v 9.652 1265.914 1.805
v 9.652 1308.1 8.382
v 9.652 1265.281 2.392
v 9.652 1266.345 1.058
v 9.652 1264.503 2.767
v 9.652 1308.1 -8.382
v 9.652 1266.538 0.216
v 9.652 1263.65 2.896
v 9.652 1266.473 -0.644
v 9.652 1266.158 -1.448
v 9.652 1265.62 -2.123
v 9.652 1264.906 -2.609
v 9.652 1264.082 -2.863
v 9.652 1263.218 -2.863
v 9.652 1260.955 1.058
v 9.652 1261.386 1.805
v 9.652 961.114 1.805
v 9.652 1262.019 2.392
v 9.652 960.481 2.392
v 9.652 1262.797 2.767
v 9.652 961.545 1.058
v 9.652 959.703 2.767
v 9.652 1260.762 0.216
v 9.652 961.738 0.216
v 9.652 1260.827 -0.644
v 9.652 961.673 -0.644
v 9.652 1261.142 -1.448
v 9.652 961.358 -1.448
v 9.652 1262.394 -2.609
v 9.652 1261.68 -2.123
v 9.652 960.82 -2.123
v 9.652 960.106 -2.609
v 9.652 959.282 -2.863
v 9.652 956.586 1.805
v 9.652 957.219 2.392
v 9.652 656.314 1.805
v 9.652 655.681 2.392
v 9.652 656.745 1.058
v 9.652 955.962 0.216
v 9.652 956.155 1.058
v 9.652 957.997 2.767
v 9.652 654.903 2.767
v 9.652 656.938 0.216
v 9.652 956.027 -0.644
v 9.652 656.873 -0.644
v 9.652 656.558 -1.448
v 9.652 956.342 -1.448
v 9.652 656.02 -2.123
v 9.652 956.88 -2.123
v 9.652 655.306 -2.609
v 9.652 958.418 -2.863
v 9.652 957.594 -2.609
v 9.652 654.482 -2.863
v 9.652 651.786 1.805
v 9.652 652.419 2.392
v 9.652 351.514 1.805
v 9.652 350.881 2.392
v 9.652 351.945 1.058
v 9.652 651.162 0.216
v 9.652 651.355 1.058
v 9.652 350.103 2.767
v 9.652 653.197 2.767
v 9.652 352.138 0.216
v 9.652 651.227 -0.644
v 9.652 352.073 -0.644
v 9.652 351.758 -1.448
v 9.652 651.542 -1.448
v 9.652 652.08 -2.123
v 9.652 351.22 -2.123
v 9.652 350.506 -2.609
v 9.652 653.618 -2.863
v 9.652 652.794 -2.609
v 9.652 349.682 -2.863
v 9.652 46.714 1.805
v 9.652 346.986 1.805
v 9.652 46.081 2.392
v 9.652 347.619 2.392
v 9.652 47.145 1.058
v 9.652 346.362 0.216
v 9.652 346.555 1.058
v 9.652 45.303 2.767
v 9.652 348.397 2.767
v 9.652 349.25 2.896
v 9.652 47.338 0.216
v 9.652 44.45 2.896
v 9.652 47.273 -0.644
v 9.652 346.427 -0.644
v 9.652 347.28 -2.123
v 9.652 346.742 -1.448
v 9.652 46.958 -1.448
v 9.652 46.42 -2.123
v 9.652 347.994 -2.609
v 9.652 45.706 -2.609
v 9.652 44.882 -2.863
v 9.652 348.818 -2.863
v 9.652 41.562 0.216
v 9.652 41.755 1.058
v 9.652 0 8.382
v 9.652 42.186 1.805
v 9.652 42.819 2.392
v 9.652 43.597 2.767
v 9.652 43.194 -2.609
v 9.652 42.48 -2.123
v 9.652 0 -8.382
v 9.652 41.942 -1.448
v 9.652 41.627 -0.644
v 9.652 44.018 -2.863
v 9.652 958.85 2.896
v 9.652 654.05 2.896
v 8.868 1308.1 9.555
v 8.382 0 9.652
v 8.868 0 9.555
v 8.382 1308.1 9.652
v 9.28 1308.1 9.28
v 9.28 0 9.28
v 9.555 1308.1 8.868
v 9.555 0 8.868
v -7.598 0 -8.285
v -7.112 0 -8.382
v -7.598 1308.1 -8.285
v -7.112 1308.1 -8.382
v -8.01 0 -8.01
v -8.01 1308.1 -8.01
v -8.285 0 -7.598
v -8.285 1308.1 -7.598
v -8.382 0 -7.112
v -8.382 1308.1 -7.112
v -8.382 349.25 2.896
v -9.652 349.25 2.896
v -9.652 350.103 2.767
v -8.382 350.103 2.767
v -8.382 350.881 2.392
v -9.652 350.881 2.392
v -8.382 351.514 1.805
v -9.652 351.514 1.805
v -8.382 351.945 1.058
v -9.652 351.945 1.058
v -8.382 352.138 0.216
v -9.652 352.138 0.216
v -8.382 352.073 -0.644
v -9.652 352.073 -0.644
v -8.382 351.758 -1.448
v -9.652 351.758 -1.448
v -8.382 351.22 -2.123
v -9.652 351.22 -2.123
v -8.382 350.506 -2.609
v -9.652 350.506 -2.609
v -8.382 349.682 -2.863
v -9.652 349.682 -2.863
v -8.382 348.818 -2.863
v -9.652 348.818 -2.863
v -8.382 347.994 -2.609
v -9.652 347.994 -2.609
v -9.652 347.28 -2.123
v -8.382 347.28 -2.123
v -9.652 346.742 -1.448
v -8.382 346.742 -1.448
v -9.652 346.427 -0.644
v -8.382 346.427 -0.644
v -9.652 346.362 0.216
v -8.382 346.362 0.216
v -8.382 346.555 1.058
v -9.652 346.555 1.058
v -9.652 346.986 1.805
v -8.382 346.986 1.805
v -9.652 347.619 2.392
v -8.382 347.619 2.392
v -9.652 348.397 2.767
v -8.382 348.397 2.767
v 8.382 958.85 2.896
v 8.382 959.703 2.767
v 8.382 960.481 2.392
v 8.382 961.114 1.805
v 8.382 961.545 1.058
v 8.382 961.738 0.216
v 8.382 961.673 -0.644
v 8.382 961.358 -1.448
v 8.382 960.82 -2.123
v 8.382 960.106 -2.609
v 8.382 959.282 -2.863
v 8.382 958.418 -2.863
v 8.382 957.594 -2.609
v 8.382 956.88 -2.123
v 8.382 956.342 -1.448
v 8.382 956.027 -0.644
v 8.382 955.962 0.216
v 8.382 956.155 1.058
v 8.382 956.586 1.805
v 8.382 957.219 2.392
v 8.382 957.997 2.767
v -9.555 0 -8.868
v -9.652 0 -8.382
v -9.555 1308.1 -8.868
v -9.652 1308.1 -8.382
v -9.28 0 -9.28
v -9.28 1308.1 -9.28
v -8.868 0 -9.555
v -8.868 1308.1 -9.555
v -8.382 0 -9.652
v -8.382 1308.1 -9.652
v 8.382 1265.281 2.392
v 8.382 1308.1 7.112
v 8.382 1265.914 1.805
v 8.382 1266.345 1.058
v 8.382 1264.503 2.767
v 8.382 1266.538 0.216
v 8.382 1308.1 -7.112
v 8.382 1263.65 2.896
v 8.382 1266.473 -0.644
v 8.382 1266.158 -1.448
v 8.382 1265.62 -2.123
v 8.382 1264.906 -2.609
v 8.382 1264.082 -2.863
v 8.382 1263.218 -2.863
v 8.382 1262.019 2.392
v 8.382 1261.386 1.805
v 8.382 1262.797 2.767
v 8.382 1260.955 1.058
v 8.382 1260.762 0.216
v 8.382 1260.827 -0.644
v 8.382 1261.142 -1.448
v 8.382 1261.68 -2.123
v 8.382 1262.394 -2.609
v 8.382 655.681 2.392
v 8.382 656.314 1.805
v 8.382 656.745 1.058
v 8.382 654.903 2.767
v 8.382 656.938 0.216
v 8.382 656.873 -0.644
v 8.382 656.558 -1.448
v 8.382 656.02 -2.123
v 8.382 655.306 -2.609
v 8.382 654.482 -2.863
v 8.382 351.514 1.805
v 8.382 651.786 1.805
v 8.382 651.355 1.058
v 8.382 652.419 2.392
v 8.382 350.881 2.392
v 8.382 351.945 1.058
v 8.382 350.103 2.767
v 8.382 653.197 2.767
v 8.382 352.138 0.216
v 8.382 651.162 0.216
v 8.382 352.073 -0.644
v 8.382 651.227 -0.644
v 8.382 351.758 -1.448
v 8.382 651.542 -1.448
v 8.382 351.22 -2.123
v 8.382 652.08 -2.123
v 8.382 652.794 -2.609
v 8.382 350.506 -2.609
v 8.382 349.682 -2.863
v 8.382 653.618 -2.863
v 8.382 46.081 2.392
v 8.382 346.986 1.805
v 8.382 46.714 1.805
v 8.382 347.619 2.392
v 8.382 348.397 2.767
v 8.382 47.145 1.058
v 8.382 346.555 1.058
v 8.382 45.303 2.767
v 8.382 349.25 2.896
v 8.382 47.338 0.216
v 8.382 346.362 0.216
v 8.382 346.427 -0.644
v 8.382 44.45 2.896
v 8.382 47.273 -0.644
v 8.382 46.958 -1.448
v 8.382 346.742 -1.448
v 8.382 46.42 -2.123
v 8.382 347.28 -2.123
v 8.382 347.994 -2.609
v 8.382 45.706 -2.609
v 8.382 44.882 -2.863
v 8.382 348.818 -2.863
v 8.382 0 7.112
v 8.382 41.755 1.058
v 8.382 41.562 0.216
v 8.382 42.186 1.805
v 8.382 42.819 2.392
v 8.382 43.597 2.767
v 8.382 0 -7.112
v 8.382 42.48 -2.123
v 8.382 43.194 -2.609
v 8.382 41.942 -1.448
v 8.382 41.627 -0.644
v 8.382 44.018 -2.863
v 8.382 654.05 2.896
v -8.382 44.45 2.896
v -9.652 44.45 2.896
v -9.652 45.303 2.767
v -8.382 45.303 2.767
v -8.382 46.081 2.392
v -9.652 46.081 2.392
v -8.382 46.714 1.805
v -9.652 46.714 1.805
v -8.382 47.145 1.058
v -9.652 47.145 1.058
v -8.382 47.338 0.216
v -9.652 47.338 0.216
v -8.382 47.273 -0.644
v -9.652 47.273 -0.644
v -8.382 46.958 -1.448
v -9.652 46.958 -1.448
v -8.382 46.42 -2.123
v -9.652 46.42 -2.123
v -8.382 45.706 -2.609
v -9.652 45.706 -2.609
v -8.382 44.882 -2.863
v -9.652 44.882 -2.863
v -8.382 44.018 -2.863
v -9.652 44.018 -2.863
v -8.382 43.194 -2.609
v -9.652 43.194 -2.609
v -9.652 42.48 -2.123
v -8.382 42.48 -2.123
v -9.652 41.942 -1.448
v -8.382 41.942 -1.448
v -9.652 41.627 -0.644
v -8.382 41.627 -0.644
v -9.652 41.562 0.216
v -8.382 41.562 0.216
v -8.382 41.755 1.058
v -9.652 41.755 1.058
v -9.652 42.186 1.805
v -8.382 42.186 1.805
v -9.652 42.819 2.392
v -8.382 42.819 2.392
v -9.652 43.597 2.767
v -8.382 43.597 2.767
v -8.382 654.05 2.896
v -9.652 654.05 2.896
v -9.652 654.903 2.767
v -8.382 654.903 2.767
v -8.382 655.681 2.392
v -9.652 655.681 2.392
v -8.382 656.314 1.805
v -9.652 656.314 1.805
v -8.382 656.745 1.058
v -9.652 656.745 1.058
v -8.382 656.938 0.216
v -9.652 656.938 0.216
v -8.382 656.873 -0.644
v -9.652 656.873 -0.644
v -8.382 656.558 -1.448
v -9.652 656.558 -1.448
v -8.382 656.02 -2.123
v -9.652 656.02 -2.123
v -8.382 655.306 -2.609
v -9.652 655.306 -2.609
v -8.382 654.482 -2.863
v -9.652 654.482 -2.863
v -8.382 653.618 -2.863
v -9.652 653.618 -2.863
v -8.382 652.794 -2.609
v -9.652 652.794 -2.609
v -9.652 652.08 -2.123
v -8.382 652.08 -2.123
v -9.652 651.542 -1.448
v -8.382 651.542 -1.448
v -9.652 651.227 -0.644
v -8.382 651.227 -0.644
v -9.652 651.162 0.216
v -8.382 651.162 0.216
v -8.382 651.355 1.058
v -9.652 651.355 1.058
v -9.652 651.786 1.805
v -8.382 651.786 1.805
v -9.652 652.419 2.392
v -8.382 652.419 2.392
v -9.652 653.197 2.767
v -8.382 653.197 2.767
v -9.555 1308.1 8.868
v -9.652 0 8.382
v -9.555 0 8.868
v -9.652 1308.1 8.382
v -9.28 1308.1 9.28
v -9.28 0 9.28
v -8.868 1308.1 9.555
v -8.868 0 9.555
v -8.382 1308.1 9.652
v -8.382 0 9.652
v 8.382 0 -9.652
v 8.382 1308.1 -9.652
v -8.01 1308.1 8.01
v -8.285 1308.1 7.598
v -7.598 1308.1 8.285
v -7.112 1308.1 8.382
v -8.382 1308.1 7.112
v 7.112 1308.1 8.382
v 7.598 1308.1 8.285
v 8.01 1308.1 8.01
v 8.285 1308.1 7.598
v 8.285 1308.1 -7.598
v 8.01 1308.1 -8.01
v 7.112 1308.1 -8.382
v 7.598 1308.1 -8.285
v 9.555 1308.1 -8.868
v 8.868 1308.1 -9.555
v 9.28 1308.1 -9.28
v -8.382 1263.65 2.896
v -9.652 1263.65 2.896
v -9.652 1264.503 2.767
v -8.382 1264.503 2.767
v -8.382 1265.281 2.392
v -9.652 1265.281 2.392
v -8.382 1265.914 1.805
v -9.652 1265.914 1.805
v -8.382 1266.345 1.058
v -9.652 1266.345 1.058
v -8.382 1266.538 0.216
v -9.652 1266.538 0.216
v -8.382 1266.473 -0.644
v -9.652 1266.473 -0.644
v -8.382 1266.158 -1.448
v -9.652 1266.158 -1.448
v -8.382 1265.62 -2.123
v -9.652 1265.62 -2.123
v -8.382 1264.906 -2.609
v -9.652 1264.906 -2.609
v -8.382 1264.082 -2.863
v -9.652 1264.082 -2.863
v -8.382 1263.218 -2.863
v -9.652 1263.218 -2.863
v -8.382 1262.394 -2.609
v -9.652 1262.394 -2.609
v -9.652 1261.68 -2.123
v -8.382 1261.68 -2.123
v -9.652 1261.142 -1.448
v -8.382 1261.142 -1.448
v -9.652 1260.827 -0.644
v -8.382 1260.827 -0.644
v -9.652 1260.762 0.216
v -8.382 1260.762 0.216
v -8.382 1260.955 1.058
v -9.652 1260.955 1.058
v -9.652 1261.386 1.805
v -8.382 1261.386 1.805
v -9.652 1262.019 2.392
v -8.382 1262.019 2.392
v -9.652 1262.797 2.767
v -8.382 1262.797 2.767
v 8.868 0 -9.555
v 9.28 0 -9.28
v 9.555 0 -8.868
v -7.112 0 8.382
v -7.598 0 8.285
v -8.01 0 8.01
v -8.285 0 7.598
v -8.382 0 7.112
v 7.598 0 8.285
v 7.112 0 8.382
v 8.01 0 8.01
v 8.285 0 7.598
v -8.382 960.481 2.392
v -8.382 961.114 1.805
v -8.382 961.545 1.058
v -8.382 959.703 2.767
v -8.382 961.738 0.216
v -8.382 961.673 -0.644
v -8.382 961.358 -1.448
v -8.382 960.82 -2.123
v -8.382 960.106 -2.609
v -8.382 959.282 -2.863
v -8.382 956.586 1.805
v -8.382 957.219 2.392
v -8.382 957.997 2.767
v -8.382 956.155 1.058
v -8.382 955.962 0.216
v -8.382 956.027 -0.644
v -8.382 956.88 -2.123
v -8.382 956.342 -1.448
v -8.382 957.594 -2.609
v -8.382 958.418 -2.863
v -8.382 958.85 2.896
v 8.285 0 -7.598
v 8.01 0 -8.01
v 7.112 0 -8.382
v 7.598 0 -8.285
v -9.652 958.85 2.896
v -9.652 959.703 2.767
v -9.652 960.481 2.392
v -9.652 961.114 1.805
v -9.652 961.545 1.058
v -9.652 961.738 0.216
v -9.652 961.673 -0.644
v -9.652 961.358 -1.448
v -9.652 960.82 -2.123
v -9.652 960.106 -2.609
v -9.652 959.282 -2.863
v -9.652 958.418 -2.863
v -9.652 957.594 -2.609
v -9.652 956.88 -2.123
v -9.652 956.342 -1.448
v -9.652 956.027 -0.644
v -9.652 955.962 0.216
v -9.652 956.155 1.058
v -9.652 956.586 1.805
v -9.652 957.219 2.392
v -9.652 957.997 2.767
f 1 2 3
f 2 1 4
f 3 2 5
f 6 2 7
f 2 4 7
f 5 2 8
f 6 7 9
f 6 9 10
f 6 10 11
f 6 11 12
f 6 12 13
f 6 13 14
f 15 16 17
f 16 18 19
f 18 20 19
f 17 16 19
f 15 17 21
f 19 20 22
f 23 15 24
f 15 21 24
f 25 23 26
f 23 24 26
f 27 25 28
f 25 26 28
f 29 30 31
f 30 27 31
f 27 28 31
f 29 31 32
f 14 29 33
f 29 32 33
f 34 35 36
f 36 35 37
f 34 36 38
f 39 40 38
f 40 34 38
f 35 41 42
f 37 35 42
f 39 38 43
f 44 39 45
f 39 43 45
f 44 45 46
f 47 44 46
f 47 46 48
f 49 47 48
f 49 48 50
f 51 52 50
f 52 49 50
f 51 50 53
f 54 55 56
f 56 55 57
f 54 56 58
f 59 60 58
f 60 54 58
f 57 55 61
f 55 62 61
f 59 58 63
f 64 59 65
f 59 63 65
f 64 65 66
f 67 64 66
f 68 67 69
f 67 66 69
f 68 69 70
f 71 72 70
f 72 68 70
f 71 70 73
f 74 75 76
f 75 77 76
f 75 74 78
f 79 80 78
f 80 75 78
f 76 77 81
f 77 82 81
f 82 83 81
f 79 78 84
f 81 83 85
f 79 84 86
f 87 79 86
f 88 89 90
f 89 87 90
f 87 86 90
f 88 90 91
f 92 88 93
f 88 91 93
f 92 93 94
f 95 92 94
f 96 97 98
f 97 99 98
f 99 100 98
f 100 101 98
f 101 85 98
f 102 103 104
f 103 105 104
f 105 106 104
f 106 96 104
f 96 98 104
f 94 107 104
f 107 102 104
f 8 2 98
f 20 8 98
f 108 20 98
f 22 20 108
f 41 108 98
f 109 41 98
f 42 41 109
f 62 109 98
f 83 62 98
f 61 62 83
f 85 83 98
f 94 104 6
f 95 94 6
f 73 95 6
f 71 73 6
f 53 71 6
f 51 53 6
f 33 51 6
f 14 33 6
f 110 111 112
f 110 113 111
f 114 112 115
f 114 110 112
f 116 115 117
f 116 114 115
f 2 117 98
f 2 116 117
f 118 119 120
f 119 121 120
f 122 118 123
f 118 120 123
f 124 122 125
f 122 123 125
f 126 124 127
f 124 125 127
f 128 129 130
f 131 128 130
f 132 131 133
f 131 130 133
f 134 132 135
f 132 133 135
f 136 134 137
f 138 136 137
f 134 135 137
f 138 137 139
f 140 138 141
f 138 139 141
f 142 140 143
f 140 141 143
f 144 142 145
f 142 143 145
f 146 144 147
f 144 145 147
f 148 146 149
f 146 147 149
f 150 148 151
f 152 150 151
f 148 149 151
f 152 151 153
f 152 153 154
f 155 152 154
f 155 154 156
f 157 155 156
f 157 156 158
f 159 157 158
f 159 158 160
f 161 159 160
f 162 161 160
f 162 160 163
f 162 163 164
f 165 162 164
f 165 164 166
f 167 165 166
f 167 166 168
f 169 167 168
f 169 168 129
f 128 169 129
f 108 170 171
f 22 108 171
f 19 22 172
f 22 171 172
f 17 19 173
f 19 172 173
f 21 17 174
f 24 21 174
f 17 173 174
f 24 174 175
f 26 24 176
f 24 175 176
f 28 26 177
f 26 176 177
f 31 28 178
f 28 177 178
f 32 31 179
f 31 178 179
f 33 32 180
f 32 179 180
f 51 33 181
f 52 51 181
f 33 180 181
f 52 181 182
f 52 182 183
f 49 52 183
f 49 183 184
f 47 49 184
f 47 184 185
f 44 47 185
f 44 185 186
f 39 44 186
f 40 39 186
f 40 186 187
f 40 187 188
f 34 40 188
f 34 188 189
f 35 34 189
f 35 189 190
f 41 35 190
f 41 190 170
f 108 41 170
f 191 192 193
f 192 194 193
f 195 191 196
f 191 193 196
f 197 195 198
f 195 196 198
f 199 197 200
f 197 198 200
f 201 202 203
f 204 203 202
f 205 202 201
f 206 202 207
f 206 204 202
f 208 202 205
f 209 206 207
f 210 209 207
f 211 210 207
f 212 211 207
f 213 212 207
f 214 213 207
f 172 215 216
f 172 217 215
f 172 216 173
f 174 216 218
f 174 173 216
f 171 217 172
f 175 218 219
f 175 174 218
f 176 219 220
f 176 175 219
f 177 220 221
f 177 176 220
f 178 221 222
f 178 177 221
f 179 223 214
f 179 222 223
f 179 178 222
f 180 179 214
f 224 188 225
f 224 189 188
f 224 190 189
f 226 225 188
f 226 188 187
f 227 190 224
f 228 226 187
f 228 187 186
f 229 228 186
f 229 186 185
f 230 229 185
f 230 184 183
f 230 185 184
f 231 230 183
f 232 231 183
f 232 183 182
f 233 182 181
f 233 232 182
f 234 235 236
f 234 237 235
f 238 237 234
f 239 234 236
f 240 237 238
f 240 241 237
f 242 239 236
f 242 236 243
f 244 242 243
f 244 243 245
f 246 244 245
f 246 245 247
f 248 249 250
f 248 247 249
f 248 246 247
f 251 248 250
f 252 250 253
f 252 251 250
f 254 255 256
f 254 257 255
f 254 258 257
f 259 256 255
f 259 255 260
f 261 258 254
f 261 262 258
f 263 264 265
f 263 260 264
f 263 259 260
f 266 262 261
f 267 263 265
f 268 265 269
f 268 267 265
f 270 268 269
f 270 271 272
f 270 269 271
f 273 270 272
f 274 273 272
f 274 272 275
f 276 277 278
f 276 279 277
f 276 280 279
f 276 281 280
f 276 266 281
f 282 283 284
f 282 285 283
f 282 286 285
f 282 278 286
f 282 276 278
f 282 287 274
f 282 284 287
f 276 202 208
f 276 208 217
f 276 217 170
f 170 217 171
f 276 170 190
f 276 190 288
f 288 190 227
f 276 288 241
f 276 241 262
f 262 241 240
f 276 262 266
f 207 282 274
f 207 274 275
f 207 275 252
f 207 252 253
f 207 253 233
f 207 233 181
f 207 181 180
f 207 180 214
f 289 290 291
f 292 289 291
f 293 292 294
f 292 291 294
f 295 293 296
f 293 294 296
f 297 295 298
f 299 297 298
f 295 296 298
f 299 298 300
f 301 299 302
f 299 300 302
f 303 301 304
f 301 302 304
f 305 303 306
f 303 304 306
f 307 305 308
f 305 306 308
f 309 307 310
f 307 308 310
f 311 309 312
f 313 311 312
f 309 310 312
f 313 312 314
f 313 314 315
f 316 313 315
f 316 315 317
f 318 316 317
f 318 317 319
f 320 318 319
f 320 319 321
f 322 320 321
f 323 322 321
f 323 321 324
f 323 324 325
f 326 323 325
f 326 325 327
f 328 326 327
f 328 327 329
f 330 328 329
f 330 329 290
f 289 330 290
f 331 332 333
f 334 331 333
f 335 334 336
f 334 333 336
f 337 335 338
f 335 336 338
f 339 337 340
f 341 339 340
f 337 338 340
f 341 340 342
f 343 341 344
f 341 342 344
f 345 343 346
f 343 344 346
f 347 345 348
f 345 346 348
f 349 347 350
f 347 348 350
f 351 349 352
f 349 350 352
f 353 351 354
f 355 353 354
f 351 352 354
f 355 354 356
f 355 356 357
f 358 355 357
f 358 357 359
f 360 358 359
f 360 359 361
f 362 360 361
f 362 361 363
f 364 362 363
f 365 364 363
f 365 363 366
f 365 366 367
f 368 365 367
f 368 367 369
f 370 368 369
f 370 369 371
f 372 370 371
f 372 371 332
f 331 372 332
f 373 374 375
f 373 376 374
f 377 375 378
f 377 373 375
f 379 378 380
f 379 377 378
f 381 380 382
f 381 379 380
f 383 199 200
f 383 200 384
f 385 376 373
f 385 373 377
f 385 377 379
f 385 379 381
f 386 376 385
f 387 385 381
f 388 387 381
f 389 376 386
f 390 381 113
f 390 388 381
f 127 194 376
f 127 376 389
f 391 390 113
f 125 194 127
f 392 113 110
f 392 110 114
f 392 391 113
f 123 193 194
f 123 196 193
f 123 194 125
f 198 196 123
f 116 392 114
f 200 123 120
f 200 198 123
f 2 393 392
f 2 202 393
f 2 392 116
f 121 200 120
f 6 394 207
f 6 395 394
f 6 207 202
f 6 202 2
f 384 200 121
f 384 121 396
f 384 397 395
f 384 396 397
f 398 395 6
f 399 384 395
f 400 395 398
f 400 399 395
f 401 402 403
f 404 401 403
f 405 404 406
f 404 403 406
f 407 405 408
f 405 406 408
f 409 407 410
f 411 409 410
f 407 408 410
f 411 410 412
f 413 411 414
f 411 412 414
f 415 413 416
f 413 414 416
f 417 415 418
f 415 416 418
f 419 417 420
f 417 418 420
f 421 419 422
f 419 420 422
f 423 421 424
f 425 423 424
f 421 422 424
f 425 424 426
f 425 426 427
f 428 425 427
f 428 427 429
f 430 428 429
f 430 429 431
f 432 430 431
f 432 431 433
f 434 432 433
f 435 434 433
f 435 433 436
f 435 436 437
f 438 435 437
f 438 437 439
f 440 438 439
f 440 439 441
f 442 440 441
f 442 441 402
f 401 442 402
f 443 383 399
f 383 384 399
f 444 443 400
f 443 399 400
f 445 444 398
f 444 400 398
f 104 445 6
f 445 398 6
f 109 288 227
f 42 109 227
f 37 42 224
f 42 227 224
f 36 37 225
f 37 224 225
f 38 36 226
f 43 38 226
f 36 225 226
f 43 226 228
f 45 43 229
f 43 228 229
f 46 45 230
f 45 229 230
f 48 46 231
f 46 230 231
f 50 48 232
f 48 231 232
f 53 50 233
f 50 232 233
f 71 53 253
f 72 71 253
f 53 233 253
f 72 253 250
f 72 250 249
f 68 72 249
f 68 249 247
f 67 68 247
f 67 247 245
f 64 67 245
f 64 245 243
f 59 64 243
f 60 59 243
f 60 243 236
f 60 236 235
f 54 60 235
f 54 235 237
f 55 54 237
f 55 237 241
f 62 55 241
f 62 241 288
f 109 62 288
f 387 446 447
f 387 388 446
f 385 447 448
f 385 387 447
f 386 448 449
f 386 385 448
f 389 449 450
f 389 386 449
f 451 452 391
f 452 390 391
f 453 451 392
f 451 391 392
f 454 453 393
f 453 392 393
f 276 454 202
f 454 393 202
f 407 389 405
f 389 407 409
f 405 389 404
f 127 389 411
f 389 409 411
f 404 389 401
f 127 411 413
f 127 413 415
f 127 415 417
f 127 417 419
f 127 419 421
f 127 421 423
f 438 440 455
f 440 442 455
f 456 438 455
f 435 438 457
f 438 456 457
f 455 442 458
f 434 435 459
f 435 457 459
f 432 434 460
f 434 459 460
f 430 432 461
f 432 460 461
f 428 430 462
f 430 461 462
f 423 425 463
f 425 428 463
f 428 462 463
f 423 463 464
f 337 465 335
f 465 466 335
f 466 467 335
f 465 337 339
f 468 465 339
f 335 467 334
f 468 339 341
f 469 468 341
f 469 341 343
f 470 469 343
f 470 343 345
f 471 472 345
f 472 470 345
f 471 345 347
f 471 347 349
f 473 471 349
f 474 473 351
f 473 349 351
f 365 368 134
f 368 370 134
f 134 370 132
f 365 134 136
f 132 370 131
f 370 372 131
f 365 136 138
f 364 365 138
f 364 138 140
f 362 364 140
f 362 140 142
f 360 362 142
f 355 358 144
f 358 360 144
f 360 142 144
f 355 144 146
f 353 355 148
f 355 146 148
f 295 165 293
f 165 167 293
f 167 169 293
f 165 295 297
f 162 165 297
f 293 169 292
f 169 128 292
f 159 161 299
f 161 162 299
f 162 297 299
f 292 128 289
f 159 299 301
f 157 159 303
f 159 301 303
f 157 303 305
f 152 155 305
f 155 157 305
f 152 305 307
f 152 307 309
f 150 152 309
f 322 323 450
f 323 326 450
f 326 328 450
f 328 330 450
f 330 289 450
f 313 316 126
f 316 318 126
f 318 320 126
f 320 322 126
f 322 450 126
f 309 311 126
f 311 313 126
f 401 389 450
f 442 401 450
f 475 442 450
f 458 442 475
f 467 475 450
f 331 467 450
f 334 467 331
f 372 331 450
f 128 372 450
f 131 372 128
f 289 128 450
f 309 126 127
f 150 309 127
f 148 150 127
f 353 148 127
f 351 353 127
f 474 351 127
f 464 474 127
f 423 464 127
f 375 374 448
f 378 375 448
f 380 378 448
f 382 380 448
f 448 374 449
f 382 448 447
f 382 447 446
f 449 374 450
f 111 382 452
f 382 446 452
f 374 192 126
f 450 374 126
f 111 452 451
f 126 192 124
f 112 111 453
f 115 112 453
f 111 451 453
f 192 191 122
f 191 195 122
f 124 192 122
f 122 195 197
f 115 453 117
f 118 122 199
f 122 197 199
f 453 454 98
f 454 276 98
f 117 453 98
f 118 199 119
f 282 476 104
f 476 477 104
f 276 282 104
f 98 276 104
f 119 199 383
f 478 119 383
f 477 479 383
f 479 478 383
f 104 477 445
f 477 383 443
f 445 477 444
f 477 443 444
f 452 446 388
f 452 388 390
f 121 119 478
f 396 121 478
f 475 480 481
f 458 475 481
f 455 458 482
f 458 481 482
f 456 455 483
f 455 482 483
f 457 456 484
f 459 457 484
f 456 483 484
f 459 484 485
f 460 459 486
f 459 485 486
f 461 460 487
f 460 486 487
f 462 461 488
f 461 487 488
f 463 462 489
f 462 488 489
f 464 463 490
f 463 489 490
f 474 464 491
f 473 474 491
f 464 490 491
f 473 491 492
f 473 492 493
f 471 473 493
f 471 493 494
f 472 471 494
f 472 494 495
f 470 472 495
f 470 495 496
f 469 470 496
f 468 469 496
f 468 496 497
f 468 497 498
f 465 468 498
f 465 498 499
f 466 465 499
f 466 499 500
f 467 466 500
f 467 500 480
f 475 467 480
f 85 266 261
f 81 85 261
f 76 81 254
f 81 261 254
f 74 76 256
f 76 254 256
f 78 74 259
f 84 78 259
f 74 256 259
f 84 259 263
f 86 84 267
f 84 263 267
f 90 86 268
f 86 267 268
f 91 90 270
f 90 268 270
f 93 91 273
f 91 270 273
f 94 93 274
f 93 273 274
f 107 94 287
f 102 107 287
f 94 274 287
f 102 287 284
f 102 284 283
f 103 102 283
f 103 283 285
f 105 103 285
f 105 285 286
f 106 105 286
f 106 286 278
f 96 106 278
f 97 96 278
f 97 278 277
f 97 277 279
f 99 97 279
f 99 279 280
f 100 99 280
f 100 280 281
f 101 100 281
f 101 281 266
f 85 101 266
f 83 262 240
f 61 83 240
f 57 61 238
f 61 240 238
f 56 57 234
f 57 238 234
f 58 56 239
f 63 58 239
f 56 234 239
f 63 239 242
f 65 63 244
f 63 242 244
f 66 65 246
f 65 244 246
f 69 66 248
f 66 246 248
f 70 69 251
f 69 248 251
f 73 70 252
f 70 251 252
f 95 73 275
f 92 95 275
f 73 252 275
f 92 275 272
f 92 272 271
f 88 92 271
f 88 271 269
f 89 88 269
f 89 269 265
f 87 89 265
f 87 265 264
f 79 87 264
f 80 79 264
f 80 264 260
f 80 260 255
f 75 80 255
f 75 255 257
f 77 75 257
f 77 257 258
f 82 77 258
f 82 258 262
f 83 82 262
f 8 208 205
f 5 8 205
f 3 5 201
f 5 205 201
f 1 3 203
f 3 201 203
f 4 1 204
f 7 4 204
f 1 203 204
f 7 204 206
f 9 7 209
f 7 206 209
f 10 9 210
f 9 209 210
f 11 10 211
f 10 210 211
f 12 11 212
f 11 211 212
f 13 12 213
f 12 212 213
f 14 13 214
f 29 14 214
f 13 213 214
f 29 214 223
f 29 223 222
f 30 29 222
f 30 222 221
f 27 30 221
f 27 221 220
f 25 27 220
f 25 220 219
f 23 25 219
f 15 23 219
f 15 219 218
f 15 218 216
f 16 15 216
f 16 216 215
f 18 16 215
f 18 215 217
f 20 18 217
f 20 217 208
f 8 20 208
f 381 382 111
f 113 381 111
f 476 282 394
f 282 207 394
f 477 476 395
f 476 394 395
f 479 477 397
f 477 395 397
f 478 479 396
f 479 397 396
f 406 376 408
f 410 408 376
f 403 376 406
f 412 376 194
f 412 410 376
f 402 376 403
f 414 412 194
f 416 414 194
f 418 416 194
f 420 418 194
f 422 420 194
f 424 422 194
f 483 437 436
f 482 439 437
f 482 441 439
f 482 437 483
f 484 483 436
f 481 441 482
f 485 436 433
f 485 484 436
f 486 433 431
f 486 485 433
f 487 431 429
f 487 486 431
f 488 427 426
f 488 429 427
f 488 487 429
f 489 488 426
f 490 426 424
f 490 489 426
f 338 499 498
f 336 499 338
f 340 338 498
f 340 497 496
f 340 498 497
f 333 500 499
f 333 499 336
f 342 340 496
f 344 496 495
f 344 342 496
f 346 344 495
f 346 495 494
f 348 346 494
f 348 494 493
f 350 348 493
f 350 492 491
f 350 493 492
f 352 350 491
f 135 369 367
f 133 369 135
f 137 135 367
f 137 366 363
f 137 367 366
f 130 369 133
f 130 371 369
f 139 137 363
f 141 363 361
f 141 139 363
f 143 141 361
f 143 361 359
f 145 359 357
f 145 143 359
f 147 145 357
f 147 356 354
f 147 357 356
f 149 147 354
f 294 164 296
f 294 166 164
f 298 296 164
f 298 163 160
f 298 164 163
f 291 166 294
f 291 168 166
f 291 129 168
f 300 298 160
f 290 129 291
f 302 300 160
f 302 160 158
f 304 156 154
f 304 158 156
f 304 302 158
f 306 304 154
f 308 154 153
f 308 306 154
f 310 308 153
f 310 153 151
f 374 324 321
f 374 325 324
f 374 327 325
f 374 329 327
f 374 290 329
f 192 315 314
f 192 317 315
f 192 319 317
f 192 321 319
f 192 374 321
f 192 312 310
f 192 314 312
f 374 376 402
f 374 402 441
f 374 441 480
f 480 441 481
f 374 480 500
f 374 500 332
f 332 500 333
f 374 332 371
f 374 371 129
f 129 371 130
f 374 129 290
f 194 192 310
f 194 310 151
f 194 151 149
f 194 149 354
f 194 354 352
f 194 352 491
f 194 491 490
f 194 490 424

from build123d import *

# Parameters (mm, degrees)
SKETCH1_W                  = 19.304
SKETCH1_H                  = 19.304
SKETCH1_W_2                = 16.764
SKETCH1_H_2                = 16.764
BOSS_EXTRUDE1_DEPTH        = 1308.1
FILLET1_R                  = 1.27
F_1_0_228_DIAMETER_HOLE1_D = 5.7912


with BuildPart() as part:
    # Sketch1 → Boss-Extrude1 (new body)
    with BuildSketch(Plane(origin=(0, 0, 0), x_dir=(1, 0, 0), z_dir=(0, 1, 0))):
        Rectangle(SKETCH1_W, SKETCH1_H)
        Rectangle(SKETCH1_W_2, SKETCH1_H_2, mode=Mode.SUBTRACT)
    extrude(amount=BOSS_EXTRUDE1_DEPTH)

    # Fillet1
    fillet1_edges = [part.edges().sort_by_distance(p)[0] for p in [
        (-8.382, 654.05, 8.382),
        (8.382, 654.05, 8.382),
        (8.382, 654.05, -8.382),
        (-8.382, 654.05, -8.382),
        (9.652, 654.05, 9.652),
        (-9.652, 654.05, 9.652),
        (-9.652, 654.05, -9.652),
        (9.652, 654.05, -9.652),
    ]]
    fillet(fillet1_edges, radius=FILLET1_R)

    # #1 (0.228) Diameter Hole1 (through all)
    with Locations(Plane(origin=(9.652, 0, 0), x_dir=(0, 0, -1), z_dir=(1, 0, 0))):
        with Locations((0, 44.45), (0, 1263.65), (0, 958.85), (0, 654.05), (0, 349.25)):
            Hole(F_1_0_228_DIAMETER_HOLE1_D / 2)


solid = part.part
